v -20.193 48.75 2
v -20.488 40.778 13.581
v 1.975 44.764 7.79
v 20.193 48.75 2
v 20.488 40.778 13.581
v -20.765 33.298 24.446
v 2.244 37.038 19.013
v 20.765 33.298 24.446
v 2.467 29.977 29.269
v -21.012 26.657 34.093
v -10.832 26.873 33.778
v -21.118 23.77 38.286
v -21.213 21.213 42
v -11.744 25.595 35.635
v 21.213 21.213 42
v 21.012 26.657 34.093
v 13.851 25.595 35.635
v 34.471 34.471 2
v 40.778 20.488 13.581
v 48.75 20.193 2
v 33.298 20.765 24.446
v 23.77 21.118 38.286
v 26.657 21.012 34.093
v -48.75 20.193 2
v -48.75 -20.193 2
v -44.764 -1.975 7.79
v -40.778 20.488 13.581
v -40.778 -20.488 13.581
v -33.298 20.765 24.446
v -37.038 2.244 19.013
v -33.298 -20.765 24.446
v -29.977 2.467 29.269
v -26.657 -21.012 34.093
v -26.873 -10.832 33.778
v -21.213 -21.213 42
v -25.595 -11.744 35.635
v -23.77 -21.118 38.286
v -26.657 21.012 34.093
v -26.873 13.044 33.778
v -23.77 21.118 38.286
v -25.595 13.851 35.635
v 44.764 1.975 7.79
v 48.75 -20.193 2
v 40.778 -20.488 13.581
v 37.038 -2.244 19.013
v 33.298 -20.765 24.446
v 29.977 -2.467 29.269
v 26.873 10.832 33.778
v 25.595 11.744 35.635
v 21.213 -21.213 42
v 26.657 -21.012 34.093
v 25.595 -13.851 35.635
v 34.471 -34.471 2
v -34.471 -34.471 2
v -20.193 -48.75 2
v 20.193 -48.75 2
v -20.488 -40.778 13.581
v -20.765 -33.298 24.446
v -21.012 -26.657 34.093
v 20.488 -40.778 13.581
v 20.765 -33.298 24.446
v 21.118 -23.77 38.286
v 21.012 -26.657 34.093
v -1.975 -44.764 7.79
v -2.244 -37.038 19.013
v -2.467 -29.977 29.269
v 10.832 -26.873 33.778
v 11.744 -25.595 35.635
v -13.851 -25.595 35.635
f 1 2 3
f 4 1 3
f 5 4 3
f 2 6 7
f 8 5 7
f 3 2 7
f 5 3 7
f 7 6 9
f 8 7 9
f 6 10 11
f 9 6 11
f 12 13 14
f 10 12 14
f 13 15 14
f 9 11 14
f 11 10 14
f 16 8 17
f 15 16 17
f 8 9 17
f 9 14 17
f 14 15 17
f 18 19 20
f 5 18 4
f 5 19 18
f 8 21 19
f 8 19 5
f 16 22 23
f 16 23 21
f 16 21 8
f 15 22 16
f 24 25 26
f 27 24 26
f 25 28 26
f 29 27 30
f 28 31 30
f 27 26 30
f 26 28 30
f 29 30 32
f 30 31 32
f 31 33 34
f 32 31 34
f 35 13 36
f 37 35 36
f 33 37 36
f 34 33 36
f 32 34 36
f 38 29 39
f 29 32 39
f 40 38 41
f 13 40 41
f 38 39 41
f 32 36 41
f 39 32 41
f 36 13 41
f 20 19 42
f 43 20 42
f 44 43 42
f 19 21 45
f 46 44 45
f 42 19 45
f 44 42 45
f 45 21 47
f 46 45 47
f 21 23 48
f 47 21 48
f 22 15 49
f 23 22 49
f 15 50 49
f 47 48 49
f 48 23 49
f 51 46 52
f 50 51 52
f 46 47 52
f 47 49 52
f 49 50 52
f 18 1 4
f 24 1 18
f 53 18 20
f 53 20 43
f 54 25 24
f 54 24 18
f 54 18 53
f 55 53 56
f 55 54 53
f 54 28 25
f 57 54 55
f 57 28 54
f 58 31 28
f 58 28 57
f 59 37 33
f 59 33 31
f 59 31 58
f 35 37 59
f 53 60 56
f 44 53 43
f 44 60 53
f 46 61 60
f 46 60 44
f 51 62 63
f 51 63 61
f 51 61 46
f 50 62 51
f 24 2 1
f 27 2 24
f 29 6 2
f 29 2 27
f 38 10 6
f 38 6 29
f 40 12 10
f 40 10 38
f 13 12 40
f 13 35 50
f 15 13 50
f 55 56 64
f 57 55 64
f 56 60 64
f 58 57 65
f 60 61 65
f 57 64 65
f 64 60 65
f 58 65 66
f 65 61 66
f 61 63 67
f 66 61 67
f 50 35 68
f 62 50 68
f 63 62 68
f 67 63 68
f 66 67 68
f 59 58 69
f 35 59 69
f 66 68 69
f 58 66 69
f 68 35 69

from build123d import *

# Parameters (mm, degrees)
F1_DEPTH = 2
F7_W     = 97.5
F7_H     = 97.5
F8_W     = 42.4264068712
F8_H     = 42.4264068712


with BuildPart() as f1:
    # F0 (on Top) → F1 (new body)
    with BuildSketch(Plane.XY):
        with BuildLine():
            ThreePointArc((34.4714555828, -34.4714555828), (45.0391272099, -18.6558173278), (48.75, 0))
            ThreePointArc((48.75, 0), (45.0391271917, 18.6558173718), (34.4714555154, 34.4714556502))
            ThreePointArc((34.4714555154, 34.4714556502), (18.655817355, 45.0391271987), (1.543e-07, 48.75))
            ThreePointArc((1.543e-07, 48.75), (-18.6558172398, 45.0391272464), (-34.4714555572, 34.4714556085))
            ThreePointArc((-34.4714555572, 34.4714556085), (-45.039127203, 18.6558173446), (-48.75, 0))
            ThreePointArc((-48.75, 0), (-45.0391272099, -18.6558173278), (-34.4714555828, -34.4714555828))
            ThreePointArc((-34.4714555828, -34.4714555828), (-18.6558173238, -45.0391272116), (8.6e-09, -48.75))
            ThreePointArc((8.6e-09, -48.75), (18.6558173318, -45.0391272083), (34.4714555828, -34.4714555828))
        make_face()
        with BuildLine():
            Line((48.75, -20.1929111657), (48.75, 0))
            ThreePointArc((48.75, 0), (45.0391272099, -18.6558173278), (34.4714555828, -34.4714555828))
            Line((34.4714555828, -34.4714555828), (48.75, -20.1929111657))
        make_face()
        with BuildLine():
            ThreePointArc((34.4714555154, 34.4714556502), (45.0391271917, 18.6558173718), (48.75, 0))
            Line((48.75, 0), (48.75, 20.1929111657))
            Line((48.75, 20.1929111657), (34.4714555154, 34.4714556502))
        make_face()
        with BuildLine():
            ThreePointArc((1.543e-07, 48.75), (18.655817355, 45.0391271987), (34.4714555154, 34.4714556502))
            Line((34.4714555154, 34.4714556502), (20.1929111657, 48.75))
            Line((20.1929111657, 48.75), (1.543e-07, 48.75))
        make_face()
        with BuildLine():
            Line((20.1929111657, -48.75), (34.4714555828, -34.4714555828))
            ThreePointArc((34.4714555828, -34.4714555828), (18.6558173318, -45.0391272083), (8.6e-09, -48.75))
            Line((8.6e-09, -48.75), (20.1929111657, -48.75))
        make_face()
        with BuildLine():
            ThreePointArc((-34.4714555572, 34.4714556085), (-18.6558172398, 45.0391272464), (1.543e-07, 48.75))
            Line((1.543e-07, 48.75), (-20.1929111657, 48.75))
            Line((-20.1929111657, 48.75), (-34.4714555572, 34.4714556085))
        make_face()
        with BuildLine():
            Line((-20.1929111657, -48.75), (8.6e-09, -48.75))
            ThreePointArc((8.6e-09, -48.75), (-18.6558173238, -45.0391272116), (-34.4714555828, -34.4714555828))
            Line((-34.4714555828, -34.4714555828), (-20.1929111657, -48.75))
        make_face()
        with BuildLine():
            ThreePointArc((-48.75, 0), (-45.039127203, 18.6558173446), (-34.4714555572, 34.4714556085))
            Line((-34.4714555572, 34.4714556085), (-48.75, 20.1929111657))
            Line((-48.75, 20.1929111657), (-48.75, 0))
        make_face()
        with BuildLine():
            Line((-48.75, -20.1929111657), (-34.4714555828, -34.4714555828))
            ThreePointArc((-34.4714555828, -34.4714555828), (-45.0391272099, -18.6558173278), (-48.75, 0))
            Line((-48.75, 0), (-48.75, -20.1929111657))
        make_face()
    extrude(amount=F1_DEPTH)

    # F4 (on face) → F5 section 0
    with BuildSketch(Plane.XY.offset(2)):
        Polygon((-48.75, 20.1929111657), (-48.75, -20.1929111657), (-20.1929111657, -48.75), (20.1929111657, -48.75), (48.75, -20.1929111657), (48.75, 20.1929111657), (20.1929111657, 48.75), (-20.1929111657, 48.75), align=None)
    # F3 (on offset) → F5 section 1
    with BuildSketch(Plane.XY.offset(42)):
        Polygon((-30, 12.4264068712), (-30, -12.4264068712), (-12.4264068712, -30), (12.4264068712, -30), (30, -12.4264068712), (30, 12.4264068712), (12.4264068712, 30), (-12.4264068712, 30), align=None)
    loft()

    # F7 (on offset) → F9 section 0
    with BuildSketch(Plane(origin=(0, 0, 2), x_dir=(1, 0, 0), z_dir=(0, 0, -1))):
        Rectangle(F7_W, F7_H)
    # F8 (on face) → F9 section 1
    with BuildSketch(Plane.XY.offset(42)):
        Rectangle(F8_W, F8_H)
    loft(mode=Mode.INTERSECT)


solid = f1.part
